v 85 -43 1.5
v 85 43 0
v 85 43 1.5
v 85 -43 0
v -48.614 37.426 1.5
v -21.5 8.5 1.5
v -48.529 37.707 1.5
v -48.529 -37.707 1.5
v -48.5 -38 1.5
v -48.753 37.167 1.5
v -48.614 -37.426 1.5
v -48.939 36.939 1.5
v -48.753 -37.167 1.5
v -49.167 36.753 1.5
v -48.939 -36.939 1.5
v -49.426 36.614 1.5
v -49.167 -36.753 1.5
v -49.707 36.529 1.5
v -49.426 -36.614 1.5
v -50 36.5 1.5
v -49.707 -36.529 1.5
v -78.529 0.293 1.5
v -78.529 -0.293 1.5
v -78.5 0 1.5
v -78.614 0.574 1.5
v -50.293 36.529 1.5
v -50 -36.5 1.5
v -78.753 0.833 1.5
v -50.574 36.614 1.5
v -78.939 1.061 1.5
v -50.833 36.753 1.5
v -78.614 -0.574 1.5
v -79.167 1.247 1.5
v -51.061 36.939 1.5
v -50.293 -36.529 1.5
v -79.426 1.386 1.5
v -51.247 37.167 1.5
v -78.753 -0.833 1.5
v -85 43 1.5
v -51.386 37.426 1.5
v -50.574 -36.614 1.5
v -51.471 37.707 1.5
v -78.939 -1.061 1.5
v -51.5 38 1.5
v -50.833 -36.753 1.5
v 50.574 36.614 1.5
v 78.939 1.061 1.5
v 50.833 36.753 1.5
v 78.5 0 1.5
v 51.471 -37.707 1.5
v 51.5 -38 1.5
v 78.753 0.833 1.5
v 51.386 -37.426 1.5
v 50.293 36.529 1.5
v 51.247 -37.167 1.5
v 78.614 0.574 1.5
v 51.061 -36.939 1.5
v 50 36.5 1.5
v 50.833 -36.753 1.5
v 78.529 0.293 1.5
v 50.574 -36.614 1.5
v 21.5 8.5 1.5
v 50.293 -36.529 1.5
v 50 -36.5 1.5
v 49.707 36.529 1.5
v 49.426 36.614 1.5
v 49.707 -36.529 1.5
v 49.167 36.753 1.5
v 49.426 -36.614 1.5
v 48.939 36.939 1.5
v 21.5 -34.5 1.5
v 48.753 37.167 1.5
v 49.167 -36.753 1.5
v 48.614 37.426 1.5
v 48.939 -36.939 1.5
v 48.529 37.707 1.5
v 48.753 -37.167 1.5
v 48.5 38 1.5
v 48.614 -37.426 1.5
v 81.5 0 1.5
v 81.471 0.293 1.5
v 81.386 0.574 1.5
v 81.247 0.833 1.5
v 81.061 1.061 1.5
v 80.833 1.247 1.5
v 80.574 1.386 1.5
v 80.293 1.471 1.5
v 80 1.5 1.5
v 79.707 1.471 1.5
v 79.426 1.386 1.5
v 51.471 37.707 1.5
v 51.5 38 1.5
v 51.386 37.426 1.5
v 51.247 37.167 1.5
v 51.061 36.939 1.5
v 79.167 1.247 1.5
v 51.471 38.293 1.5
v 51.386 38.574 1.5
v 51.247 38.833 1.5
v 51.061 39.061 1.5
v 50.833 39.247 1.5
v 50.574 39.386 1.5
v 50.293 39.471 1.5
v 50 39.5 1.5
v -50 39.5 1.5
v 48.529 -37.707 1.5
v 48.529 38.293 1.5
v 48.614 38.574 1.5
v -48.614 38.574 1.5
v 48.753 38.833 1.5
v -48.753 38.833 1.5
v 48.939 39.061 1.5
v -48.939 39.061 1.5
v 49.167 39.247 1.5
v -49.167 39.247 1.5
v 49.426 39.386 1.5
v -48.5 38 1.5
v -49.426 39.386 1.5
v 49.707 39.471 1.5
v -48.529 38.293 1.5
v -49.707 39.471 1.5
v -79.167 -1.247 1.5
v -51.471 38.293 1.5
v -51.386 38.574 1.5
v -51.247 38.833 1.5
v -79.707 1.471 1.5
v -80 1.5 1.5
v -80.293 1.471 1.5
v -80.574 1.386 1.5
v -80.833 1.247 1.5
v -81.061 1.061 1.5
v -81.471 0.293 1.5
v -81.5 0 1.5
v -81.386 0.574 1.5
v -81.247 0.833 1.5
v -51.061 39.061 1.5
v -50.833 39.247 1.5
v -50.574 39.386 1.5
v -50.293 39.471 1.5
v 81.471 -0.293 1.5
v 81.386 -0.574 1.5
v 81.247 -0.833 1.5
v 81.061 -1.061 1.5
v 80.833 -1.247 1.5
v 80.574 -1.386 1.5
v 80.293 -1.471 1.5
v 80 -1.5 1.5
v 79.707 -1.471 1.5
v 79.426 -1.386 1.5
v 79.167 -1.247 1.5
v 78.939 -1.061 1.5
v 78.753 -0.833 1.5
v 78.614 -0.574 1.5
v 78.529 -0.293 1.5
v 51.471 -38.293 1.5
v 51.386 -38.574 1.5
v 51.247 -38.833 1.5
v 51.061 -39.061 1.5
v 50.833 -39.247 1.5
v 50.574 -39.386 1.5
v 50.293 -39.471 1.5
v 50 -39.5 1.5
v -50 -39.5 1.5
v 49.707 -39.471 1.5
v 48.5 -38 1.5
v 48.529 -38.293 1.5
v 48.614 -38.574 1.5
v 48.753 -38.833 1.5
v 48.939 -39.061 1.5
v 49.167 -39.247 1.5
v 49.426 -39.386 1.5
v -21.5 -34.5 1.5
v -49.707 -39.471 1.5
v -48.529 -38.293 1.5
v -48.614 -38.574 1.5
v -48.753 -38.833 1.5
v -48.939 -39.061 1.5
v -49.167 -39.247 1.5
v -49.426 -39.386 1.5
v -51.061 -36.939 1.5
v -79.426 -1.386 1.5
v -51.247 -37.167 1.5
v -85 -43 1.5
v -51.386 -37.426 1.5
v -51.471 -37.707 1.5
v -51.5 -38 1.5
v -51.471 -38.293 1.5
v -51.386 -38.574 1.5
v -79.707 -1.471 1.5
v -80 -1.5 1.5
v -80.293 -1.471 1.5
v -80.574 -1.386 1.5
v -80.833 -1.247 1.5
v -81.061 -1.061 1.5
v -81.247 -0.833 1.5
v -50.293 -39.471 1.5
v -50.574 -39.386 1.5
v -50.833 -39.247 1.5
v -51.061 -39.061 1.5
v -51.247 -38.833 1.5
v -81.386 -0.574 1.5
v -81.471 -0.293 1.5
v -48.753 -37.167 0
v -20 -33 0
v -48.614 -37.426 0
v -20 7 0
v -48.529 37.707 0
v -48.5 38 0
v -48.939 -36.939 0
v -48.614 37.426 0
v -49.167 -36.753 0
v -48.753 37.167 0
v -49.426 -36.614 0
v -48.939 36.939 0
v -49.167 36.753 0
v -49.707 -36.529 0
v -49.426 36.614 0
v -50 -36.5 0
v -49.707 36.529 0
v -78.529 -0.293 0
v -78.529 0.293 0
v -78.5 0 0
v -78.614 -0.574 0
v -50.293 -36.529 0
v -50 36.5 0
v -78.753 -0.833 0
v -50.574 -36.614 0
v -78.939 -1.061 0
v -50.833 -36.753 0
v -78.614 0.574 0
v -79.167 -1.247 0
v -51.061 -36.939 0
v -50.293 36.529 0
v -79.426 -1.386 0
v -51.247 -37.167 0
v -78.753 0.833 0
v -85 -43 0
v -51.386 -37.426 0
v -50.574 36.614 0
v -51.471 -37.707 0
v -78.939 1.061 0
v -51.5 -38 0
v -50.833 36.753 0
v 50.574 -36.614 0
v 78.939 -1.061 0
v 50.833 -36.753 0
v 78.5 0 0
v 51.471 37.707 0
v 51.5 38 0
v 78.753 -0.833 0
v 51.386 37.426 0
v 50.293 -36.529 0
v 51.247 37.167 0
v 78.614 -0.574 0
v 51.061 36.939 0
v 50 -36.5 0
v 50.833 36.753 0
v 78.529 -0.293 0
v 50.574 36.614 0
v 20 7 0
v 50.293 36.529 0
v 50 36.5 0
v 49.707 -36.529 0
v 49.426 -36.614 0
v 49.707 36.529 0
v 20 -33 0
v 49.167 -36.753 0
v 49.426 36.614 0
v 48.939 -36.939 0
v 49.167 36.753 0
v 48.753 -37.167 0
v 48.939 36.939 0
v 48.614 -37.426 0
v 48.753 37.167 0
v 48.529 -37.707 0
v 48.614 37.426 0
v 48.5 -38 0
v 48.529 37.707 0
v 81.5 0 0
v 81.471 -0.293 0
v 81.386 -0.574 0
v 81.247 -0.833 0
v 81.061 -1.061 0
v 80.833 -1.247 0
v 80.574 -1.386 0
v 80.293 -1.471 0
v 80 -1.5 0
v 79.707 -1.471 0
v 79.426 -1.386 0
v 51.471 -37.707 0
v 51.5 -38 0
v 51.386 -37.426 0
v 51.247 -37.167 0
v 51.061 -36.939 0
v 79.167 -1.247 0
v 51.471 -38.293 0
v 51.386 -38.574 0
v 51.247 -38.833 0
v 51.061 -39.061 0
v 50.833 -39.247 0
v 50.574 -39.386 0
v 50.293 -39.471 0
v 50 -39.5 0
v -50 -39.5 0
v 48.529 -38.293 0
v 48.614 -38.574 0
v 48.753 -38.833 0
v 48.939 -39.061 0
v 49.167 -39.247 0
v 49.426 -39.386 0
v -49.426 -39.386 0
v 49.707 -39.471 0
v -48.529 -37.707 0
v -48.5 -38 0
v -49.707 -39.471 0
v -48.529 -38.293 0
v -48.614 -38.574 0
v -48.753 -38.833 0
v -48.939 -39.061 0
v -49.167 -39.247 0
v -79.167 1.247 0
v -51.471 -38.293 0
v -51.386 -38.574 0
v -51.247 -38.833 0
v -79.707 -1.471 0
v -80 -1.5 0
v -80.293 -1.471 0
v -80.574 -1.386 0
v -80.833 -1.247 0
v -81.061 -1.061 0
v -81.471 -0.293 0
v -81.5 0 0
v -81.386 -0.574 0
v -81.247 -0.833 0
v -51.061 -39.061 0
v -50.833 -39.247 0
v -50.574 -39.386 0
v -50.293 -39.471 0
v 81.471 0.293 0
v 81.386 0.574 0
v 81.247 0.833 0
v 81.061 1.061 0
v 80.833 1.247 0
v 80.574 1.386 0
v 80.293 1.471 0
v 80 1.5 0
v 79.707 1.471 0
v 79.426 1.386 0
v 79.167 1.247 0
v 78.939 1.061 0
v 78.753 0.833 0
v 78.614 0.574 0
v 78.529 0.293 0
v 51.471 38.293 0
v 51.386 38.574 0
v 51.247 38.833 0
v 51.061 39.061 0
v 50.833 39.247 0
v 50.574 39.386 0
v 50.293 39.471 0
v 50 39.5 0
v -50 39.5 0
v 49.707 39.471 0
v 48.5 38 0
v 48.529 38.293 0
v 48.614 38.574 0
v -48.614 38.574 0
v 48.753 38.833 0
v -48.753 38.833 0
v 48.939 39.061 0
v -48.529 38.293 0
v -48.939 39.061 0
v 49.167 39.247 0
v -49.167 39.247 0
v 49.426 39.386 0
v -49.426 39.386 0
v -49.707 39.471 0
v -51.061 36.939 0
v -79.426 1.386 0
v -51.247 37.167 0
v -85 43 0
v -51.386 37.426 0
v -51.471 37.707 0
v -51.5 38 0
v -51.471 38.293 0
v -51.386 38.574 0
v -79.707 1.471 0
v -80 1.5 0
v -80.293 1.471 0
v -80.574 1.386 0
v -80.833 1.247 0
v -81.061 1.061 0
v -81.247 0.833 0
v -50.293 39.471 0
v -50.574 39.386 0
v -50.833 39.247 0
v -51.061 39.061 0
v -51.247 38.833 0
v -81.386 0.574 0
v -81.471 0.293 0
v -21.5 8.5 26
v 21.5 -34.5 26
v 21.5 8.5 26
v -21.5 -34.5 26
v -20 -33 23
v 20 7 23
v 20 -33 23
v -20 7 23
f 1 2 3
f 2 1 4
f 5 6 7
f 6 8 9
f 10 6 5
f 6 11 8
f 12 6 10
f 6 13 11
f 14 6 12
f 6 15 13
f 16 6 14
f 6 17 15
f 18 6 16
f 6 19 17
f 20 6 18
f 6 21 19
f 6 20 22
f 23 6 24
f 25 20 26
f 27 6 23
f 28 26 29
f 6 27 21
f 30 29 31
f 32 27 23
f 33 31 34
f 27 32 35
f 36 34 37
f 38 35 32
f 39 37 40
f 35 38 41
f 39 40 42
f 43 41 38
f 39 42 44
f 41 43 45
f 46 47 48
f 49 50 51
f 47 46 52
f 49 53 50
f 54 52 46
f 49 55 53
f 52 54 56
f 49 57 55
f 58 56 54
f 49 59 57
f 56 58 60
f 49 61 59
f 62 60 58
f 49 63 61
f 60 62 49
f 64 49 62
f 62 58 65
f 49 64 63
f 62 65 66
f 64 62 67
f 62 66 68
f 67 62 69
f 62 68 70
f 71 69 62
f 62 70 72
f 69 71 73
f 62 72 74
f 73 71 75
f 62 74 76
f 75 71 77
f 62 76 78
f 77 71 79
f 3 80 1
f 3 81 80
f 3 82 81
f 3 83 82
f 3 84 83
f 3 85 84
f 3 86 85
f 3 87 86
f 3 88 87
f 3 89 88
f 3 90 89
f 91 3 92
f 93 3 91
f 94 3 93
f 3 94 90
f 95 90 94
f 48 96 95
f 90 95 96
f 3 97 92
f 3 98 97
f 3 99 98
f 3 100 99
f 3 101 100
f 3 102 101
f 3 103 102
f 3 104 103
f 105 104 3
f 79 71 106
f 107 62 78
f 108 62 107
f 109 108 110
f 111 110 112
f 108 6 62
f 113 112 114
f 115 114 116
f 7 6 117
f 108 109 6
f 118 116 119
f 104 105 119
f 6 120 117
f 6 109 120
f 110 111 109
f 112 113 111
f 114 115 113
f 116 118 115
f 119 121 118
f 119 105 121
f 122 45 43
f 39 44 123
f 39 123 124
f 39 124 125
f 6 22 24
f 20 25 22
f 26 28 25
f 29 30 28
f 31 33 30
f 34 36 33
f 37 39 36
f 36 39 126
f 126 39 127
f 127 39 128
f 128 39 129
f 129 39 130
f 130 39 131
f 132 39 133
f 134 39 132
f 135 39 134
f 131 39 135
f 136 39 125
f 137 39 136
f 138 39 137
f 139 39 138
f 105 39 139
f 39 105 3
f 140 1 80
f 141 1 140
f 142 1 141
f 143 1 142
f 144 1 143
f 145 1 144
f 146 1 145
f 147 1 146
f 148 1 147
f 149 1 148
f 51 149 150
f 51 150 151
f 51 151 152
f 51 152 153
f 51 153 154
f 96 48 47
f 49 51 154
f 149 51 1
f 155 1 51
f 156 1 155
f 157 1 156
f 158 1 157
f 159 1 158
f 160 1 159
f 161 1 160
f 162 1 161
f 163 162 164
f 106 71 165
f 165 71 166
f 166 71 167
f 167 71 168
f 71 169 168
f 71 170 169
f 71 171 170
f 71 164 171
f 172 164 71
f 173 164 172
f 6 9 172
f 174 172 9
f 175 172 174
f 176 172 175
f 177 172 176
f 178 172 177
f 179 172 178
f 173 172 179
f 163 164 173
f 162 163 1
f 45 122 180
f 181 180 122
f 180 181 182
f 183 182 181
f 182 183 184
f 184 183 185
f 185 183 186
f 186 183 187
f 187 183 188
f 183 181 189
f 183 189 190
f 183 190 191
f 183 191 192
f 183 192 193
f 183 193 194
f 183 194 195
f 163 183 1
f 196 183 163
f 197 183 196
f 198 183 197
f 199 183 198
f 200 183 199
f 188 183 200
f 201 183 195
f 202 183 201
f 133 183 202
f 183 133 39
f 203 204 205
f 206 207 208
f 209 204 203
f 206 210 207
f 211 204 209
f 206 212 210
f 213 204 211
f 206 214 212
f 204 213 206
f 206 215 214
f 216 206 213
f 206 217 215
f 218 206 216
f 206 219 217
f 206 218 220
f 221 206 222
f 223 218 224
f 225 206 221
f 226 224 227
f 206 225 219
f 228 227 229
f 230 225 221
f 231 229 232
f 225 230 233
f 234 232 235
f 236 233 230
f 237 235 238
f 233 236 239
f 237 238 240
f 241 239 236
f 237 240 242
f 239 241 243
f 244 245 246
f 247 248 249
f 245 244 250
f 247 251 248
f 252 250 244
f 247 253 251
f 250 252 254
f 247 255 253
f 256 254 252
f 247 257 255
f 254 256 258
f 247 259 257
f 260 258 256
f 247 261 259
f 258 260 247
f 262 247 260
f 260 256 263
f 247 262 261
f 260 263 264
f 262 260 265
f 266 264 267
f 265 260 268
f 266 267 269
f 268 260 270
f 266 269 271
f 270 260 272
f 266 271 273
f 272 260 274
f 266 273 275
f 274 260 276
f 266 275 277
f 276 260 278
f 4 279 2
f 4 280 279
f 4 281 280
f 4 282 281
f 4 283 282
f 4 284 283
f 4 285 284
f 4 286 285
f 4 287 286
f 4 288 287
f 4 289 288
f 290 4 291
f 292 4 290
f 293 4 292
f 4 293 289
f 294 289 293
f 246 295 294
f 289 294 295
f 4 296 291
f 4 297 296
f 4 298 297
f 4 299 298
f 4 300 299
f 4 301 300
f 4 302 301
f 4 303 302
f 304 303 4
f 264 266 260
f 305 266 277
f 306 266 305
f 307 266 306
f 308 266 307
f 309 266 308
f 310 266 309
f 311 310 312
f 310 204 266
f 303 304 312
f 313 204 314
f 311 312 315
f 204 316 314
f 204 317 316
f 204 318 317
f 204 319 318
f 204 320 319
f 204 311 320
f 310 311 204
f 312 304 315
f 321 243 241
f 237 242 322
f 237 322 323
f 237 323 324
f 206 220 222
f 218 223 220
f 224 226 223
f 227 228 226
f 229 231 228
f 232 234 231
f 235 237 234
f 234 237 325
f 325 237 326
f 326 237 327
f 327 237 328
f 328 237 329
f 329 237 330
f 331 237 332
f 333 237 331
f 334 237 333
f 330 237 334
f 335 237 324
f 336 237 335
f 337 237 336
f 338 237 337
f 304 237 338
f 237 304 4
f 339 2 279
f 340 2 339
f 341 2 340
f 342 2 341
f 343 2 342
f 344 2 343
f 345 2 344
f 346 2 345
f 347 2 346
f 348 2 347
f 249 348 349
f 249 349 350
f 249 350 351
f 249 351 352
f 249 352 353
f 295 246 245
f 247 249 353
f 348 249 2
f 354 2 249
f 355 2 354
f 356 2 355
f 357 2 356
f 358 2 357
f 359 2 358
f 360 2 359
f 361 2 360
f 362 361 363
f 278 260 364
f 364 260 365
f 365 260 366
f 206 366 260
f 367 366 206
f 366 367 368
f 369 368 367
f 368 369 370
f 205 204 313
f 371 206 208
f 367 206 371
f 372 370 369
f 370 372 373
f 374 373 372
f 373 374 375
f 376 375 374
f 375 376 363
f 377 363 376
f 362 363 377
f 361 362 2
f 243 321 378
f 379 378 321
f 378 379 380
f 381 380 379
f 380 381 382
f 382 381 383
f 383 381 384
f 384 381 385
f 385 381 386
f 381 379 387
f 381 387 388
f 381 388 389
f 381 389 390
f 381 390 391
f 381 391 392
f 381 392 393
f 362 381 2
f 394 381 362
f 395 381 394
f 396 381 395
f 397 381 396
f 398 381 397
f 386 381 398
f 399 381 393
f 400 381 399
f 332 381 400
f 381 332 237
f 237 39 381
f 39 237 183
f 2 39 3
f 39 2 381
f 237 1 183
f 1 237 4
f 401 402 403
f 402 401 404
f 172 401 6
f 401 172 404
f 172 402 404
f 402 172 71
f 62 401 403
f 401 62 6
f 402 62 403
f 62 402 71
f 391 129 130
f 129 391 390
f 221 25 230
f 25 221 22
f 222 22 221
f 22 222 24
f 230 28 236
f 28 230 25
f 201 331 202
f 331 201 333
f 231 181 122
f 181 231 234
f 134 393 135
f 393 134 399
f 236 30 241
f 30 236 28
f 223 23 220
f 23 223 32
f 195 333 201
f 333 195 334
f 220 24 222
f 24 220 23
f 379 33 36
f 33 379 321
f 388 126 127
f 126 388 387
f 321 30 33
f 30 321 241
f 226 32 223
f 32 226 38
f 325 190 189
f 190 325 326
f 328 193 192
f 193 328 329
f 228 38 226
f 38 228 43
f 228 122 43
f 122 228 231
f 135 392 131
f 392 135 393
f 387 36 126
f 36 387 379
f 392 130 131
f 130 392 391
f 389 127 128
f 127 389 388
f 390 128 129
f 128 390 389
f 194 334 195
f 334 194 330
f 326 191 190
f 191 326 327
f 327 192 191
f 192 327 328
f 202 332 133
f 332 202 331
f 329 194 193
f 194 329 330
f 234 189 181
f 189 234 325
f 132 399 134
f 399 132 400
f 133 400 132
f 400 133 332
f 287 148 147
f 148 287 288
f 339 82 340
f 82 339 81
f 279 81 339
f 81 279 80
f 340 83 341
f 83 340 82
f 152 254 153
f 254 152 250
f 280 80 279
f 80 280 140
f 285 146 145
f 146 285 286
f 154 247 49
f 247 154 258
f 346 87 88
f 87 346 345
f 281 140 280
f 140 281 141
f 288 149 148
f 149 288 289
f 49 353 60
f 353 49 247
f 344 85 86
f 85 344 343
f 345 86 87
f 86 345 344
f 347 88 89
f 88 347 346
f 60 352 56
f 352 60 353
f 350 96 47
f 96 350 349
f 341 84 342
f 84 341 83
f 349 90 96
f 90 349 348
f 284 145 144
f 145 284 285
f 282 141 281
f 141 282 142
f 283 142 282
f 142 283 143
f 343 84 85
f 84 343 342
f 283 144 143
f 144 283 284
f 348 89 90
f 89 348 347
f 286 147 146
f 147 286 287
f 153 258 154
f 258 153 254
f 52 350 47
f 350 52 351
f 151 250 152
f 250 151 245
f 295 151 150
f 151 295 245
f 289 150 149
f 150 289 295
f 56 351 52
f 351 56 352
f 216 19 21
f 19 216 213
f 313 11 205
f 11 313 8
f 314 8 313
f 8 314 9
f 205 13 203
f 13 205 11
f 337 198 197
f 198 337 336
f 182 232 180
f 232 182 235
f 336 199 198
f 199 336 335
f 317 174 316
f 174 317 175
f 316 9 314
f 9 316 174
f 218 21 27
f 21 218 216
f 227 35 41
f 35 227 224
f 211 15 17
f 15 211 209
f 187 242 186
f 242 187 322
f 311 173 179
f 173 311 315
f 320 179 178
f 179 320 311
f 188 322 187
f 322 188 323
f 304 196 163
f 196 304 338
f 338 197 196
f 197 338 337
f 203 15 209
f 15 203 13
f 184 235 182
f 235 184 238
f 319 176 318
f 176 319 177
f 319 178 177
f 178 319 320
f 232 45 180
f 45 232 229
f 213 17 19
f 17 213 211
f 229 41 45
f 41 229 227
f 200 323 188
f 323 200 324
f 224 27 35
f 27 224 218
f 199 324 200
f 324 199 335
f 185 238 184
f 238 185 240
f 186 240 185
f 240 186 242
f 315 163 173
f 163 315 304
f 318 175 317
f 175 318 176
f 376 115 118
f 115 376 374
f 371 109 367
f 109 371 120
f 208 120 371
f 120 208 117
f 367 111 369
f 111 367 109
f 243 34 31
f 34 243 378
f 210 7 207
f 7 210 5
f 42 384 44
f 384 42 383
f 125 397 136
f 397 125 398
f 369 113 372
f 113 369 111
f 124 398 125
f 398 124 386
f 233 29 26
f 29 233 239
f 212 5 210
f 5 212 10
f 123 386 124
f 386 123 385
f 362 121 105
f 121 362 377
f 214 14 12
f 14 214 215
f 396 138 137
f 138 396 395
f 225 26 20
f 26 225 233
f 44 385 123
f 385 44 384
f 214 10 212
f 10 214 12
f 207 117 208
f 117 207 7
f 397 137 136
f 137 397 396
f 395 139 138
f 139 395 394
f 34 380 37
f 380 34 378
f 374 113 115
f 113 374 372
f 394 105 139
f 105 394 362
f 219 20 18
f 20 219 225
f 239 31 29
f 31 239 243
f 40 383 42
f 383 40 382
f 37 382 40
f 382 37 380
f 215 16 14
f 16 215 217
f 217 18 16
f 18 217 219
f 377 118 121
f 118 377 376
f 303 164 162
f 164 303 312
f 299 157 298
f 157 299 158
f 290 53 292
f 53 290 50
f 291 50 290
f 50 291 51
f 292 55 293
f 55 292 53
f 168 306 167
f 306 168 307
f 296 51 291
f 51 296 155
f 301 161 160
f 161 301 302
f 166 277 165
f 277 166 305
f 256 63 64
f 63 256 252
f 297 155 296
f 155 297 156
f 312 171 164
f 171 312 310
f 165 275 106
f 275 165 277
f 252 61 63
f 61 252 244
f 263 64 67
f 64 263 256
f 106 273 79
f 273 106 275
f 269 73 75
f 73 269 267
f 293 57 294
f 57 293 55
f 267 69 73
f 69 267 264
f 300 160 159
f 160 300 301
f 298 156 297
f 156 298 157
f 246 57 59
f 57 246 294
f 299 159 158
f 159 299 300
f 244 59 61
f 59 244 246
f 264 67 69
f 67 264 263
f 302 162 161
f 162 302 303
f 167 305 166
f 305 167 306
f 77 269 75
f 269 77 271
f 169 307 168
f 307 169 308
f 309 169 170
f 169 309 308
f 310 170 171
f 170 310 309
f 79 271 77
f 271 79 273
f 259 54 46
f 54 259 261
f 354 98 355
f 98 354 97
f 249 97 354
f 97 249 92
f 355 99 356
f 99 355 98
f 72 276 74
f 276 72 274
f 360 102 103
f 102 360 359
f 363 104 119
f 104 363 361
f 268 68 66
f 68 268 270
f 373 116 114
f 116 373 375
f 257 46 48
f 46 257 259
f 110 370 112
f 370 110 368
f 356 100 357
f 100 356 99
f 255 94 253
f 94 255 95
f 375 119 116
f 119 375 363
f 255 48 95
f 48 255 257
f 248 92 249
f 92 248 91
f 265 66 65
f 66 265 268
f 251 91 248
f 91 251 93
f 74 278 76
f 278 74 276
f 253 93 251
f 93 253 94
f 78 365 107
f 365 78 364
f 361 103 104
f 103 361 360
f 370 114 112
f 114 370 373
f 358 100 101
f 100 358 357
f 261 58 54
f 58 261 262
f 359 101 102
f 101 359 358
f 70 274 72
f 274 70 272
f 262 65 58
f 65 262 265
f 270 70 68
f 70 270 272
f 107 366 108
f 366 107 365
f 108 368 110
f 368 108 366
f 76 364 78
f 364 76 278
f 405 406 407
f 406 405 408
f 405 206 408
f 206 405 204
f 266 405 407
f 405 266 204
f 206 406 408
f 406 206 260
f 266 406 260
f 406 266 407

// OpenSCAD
L=170;
W=86;
T=1.5;
ML=40;
MW=40;
MH=23;

difference() {
    union() {
        cube_center([L,W,T]);
        translate([0,-13,0])
        minkowski() {
            cube_center([ML+2*T,MW+2*T,0.0001]);
            rotate([0,0,45])
            cylinder($fn=4,h=MH+2*T,d1=0.0001,d2=0.0001);
        }
    }
    
    translate([0,-13,0])
    minkowski() {
        cube_center([ML,MW,0.0001]);
        rotate([0,0,45])
        cylinder($fn=4,h=MH,d1=0.0001,d2=0.0001);
    }
    
    
    for(s=[-1,1])
    translate([s*(L/2-5),0,0])
    cylinder(d=3,$fn=32,h=10);
    
    for(s=[-1,1]) for(t=[-1,1])
    translate([s*(L/2-35),t*(W/2-5),0])
    cylinder(d=3,$fn=32,h=10);
}


module cube_center(dims,r=0) {
    if(r==0) {
        translate([-dims[0]/2, -dims[1]/2, 0])
        cube(dims);
    } else {
        
        minkowski() {
            translate([-dims[0]/2+r, -dims[1]/2+r, 0])
            cube([dims[0]-2*r,dims[1]-2*r,dims[2]]);
            cylinder(r=r,h=0.00001,$fn=32);
        }
    }
}
